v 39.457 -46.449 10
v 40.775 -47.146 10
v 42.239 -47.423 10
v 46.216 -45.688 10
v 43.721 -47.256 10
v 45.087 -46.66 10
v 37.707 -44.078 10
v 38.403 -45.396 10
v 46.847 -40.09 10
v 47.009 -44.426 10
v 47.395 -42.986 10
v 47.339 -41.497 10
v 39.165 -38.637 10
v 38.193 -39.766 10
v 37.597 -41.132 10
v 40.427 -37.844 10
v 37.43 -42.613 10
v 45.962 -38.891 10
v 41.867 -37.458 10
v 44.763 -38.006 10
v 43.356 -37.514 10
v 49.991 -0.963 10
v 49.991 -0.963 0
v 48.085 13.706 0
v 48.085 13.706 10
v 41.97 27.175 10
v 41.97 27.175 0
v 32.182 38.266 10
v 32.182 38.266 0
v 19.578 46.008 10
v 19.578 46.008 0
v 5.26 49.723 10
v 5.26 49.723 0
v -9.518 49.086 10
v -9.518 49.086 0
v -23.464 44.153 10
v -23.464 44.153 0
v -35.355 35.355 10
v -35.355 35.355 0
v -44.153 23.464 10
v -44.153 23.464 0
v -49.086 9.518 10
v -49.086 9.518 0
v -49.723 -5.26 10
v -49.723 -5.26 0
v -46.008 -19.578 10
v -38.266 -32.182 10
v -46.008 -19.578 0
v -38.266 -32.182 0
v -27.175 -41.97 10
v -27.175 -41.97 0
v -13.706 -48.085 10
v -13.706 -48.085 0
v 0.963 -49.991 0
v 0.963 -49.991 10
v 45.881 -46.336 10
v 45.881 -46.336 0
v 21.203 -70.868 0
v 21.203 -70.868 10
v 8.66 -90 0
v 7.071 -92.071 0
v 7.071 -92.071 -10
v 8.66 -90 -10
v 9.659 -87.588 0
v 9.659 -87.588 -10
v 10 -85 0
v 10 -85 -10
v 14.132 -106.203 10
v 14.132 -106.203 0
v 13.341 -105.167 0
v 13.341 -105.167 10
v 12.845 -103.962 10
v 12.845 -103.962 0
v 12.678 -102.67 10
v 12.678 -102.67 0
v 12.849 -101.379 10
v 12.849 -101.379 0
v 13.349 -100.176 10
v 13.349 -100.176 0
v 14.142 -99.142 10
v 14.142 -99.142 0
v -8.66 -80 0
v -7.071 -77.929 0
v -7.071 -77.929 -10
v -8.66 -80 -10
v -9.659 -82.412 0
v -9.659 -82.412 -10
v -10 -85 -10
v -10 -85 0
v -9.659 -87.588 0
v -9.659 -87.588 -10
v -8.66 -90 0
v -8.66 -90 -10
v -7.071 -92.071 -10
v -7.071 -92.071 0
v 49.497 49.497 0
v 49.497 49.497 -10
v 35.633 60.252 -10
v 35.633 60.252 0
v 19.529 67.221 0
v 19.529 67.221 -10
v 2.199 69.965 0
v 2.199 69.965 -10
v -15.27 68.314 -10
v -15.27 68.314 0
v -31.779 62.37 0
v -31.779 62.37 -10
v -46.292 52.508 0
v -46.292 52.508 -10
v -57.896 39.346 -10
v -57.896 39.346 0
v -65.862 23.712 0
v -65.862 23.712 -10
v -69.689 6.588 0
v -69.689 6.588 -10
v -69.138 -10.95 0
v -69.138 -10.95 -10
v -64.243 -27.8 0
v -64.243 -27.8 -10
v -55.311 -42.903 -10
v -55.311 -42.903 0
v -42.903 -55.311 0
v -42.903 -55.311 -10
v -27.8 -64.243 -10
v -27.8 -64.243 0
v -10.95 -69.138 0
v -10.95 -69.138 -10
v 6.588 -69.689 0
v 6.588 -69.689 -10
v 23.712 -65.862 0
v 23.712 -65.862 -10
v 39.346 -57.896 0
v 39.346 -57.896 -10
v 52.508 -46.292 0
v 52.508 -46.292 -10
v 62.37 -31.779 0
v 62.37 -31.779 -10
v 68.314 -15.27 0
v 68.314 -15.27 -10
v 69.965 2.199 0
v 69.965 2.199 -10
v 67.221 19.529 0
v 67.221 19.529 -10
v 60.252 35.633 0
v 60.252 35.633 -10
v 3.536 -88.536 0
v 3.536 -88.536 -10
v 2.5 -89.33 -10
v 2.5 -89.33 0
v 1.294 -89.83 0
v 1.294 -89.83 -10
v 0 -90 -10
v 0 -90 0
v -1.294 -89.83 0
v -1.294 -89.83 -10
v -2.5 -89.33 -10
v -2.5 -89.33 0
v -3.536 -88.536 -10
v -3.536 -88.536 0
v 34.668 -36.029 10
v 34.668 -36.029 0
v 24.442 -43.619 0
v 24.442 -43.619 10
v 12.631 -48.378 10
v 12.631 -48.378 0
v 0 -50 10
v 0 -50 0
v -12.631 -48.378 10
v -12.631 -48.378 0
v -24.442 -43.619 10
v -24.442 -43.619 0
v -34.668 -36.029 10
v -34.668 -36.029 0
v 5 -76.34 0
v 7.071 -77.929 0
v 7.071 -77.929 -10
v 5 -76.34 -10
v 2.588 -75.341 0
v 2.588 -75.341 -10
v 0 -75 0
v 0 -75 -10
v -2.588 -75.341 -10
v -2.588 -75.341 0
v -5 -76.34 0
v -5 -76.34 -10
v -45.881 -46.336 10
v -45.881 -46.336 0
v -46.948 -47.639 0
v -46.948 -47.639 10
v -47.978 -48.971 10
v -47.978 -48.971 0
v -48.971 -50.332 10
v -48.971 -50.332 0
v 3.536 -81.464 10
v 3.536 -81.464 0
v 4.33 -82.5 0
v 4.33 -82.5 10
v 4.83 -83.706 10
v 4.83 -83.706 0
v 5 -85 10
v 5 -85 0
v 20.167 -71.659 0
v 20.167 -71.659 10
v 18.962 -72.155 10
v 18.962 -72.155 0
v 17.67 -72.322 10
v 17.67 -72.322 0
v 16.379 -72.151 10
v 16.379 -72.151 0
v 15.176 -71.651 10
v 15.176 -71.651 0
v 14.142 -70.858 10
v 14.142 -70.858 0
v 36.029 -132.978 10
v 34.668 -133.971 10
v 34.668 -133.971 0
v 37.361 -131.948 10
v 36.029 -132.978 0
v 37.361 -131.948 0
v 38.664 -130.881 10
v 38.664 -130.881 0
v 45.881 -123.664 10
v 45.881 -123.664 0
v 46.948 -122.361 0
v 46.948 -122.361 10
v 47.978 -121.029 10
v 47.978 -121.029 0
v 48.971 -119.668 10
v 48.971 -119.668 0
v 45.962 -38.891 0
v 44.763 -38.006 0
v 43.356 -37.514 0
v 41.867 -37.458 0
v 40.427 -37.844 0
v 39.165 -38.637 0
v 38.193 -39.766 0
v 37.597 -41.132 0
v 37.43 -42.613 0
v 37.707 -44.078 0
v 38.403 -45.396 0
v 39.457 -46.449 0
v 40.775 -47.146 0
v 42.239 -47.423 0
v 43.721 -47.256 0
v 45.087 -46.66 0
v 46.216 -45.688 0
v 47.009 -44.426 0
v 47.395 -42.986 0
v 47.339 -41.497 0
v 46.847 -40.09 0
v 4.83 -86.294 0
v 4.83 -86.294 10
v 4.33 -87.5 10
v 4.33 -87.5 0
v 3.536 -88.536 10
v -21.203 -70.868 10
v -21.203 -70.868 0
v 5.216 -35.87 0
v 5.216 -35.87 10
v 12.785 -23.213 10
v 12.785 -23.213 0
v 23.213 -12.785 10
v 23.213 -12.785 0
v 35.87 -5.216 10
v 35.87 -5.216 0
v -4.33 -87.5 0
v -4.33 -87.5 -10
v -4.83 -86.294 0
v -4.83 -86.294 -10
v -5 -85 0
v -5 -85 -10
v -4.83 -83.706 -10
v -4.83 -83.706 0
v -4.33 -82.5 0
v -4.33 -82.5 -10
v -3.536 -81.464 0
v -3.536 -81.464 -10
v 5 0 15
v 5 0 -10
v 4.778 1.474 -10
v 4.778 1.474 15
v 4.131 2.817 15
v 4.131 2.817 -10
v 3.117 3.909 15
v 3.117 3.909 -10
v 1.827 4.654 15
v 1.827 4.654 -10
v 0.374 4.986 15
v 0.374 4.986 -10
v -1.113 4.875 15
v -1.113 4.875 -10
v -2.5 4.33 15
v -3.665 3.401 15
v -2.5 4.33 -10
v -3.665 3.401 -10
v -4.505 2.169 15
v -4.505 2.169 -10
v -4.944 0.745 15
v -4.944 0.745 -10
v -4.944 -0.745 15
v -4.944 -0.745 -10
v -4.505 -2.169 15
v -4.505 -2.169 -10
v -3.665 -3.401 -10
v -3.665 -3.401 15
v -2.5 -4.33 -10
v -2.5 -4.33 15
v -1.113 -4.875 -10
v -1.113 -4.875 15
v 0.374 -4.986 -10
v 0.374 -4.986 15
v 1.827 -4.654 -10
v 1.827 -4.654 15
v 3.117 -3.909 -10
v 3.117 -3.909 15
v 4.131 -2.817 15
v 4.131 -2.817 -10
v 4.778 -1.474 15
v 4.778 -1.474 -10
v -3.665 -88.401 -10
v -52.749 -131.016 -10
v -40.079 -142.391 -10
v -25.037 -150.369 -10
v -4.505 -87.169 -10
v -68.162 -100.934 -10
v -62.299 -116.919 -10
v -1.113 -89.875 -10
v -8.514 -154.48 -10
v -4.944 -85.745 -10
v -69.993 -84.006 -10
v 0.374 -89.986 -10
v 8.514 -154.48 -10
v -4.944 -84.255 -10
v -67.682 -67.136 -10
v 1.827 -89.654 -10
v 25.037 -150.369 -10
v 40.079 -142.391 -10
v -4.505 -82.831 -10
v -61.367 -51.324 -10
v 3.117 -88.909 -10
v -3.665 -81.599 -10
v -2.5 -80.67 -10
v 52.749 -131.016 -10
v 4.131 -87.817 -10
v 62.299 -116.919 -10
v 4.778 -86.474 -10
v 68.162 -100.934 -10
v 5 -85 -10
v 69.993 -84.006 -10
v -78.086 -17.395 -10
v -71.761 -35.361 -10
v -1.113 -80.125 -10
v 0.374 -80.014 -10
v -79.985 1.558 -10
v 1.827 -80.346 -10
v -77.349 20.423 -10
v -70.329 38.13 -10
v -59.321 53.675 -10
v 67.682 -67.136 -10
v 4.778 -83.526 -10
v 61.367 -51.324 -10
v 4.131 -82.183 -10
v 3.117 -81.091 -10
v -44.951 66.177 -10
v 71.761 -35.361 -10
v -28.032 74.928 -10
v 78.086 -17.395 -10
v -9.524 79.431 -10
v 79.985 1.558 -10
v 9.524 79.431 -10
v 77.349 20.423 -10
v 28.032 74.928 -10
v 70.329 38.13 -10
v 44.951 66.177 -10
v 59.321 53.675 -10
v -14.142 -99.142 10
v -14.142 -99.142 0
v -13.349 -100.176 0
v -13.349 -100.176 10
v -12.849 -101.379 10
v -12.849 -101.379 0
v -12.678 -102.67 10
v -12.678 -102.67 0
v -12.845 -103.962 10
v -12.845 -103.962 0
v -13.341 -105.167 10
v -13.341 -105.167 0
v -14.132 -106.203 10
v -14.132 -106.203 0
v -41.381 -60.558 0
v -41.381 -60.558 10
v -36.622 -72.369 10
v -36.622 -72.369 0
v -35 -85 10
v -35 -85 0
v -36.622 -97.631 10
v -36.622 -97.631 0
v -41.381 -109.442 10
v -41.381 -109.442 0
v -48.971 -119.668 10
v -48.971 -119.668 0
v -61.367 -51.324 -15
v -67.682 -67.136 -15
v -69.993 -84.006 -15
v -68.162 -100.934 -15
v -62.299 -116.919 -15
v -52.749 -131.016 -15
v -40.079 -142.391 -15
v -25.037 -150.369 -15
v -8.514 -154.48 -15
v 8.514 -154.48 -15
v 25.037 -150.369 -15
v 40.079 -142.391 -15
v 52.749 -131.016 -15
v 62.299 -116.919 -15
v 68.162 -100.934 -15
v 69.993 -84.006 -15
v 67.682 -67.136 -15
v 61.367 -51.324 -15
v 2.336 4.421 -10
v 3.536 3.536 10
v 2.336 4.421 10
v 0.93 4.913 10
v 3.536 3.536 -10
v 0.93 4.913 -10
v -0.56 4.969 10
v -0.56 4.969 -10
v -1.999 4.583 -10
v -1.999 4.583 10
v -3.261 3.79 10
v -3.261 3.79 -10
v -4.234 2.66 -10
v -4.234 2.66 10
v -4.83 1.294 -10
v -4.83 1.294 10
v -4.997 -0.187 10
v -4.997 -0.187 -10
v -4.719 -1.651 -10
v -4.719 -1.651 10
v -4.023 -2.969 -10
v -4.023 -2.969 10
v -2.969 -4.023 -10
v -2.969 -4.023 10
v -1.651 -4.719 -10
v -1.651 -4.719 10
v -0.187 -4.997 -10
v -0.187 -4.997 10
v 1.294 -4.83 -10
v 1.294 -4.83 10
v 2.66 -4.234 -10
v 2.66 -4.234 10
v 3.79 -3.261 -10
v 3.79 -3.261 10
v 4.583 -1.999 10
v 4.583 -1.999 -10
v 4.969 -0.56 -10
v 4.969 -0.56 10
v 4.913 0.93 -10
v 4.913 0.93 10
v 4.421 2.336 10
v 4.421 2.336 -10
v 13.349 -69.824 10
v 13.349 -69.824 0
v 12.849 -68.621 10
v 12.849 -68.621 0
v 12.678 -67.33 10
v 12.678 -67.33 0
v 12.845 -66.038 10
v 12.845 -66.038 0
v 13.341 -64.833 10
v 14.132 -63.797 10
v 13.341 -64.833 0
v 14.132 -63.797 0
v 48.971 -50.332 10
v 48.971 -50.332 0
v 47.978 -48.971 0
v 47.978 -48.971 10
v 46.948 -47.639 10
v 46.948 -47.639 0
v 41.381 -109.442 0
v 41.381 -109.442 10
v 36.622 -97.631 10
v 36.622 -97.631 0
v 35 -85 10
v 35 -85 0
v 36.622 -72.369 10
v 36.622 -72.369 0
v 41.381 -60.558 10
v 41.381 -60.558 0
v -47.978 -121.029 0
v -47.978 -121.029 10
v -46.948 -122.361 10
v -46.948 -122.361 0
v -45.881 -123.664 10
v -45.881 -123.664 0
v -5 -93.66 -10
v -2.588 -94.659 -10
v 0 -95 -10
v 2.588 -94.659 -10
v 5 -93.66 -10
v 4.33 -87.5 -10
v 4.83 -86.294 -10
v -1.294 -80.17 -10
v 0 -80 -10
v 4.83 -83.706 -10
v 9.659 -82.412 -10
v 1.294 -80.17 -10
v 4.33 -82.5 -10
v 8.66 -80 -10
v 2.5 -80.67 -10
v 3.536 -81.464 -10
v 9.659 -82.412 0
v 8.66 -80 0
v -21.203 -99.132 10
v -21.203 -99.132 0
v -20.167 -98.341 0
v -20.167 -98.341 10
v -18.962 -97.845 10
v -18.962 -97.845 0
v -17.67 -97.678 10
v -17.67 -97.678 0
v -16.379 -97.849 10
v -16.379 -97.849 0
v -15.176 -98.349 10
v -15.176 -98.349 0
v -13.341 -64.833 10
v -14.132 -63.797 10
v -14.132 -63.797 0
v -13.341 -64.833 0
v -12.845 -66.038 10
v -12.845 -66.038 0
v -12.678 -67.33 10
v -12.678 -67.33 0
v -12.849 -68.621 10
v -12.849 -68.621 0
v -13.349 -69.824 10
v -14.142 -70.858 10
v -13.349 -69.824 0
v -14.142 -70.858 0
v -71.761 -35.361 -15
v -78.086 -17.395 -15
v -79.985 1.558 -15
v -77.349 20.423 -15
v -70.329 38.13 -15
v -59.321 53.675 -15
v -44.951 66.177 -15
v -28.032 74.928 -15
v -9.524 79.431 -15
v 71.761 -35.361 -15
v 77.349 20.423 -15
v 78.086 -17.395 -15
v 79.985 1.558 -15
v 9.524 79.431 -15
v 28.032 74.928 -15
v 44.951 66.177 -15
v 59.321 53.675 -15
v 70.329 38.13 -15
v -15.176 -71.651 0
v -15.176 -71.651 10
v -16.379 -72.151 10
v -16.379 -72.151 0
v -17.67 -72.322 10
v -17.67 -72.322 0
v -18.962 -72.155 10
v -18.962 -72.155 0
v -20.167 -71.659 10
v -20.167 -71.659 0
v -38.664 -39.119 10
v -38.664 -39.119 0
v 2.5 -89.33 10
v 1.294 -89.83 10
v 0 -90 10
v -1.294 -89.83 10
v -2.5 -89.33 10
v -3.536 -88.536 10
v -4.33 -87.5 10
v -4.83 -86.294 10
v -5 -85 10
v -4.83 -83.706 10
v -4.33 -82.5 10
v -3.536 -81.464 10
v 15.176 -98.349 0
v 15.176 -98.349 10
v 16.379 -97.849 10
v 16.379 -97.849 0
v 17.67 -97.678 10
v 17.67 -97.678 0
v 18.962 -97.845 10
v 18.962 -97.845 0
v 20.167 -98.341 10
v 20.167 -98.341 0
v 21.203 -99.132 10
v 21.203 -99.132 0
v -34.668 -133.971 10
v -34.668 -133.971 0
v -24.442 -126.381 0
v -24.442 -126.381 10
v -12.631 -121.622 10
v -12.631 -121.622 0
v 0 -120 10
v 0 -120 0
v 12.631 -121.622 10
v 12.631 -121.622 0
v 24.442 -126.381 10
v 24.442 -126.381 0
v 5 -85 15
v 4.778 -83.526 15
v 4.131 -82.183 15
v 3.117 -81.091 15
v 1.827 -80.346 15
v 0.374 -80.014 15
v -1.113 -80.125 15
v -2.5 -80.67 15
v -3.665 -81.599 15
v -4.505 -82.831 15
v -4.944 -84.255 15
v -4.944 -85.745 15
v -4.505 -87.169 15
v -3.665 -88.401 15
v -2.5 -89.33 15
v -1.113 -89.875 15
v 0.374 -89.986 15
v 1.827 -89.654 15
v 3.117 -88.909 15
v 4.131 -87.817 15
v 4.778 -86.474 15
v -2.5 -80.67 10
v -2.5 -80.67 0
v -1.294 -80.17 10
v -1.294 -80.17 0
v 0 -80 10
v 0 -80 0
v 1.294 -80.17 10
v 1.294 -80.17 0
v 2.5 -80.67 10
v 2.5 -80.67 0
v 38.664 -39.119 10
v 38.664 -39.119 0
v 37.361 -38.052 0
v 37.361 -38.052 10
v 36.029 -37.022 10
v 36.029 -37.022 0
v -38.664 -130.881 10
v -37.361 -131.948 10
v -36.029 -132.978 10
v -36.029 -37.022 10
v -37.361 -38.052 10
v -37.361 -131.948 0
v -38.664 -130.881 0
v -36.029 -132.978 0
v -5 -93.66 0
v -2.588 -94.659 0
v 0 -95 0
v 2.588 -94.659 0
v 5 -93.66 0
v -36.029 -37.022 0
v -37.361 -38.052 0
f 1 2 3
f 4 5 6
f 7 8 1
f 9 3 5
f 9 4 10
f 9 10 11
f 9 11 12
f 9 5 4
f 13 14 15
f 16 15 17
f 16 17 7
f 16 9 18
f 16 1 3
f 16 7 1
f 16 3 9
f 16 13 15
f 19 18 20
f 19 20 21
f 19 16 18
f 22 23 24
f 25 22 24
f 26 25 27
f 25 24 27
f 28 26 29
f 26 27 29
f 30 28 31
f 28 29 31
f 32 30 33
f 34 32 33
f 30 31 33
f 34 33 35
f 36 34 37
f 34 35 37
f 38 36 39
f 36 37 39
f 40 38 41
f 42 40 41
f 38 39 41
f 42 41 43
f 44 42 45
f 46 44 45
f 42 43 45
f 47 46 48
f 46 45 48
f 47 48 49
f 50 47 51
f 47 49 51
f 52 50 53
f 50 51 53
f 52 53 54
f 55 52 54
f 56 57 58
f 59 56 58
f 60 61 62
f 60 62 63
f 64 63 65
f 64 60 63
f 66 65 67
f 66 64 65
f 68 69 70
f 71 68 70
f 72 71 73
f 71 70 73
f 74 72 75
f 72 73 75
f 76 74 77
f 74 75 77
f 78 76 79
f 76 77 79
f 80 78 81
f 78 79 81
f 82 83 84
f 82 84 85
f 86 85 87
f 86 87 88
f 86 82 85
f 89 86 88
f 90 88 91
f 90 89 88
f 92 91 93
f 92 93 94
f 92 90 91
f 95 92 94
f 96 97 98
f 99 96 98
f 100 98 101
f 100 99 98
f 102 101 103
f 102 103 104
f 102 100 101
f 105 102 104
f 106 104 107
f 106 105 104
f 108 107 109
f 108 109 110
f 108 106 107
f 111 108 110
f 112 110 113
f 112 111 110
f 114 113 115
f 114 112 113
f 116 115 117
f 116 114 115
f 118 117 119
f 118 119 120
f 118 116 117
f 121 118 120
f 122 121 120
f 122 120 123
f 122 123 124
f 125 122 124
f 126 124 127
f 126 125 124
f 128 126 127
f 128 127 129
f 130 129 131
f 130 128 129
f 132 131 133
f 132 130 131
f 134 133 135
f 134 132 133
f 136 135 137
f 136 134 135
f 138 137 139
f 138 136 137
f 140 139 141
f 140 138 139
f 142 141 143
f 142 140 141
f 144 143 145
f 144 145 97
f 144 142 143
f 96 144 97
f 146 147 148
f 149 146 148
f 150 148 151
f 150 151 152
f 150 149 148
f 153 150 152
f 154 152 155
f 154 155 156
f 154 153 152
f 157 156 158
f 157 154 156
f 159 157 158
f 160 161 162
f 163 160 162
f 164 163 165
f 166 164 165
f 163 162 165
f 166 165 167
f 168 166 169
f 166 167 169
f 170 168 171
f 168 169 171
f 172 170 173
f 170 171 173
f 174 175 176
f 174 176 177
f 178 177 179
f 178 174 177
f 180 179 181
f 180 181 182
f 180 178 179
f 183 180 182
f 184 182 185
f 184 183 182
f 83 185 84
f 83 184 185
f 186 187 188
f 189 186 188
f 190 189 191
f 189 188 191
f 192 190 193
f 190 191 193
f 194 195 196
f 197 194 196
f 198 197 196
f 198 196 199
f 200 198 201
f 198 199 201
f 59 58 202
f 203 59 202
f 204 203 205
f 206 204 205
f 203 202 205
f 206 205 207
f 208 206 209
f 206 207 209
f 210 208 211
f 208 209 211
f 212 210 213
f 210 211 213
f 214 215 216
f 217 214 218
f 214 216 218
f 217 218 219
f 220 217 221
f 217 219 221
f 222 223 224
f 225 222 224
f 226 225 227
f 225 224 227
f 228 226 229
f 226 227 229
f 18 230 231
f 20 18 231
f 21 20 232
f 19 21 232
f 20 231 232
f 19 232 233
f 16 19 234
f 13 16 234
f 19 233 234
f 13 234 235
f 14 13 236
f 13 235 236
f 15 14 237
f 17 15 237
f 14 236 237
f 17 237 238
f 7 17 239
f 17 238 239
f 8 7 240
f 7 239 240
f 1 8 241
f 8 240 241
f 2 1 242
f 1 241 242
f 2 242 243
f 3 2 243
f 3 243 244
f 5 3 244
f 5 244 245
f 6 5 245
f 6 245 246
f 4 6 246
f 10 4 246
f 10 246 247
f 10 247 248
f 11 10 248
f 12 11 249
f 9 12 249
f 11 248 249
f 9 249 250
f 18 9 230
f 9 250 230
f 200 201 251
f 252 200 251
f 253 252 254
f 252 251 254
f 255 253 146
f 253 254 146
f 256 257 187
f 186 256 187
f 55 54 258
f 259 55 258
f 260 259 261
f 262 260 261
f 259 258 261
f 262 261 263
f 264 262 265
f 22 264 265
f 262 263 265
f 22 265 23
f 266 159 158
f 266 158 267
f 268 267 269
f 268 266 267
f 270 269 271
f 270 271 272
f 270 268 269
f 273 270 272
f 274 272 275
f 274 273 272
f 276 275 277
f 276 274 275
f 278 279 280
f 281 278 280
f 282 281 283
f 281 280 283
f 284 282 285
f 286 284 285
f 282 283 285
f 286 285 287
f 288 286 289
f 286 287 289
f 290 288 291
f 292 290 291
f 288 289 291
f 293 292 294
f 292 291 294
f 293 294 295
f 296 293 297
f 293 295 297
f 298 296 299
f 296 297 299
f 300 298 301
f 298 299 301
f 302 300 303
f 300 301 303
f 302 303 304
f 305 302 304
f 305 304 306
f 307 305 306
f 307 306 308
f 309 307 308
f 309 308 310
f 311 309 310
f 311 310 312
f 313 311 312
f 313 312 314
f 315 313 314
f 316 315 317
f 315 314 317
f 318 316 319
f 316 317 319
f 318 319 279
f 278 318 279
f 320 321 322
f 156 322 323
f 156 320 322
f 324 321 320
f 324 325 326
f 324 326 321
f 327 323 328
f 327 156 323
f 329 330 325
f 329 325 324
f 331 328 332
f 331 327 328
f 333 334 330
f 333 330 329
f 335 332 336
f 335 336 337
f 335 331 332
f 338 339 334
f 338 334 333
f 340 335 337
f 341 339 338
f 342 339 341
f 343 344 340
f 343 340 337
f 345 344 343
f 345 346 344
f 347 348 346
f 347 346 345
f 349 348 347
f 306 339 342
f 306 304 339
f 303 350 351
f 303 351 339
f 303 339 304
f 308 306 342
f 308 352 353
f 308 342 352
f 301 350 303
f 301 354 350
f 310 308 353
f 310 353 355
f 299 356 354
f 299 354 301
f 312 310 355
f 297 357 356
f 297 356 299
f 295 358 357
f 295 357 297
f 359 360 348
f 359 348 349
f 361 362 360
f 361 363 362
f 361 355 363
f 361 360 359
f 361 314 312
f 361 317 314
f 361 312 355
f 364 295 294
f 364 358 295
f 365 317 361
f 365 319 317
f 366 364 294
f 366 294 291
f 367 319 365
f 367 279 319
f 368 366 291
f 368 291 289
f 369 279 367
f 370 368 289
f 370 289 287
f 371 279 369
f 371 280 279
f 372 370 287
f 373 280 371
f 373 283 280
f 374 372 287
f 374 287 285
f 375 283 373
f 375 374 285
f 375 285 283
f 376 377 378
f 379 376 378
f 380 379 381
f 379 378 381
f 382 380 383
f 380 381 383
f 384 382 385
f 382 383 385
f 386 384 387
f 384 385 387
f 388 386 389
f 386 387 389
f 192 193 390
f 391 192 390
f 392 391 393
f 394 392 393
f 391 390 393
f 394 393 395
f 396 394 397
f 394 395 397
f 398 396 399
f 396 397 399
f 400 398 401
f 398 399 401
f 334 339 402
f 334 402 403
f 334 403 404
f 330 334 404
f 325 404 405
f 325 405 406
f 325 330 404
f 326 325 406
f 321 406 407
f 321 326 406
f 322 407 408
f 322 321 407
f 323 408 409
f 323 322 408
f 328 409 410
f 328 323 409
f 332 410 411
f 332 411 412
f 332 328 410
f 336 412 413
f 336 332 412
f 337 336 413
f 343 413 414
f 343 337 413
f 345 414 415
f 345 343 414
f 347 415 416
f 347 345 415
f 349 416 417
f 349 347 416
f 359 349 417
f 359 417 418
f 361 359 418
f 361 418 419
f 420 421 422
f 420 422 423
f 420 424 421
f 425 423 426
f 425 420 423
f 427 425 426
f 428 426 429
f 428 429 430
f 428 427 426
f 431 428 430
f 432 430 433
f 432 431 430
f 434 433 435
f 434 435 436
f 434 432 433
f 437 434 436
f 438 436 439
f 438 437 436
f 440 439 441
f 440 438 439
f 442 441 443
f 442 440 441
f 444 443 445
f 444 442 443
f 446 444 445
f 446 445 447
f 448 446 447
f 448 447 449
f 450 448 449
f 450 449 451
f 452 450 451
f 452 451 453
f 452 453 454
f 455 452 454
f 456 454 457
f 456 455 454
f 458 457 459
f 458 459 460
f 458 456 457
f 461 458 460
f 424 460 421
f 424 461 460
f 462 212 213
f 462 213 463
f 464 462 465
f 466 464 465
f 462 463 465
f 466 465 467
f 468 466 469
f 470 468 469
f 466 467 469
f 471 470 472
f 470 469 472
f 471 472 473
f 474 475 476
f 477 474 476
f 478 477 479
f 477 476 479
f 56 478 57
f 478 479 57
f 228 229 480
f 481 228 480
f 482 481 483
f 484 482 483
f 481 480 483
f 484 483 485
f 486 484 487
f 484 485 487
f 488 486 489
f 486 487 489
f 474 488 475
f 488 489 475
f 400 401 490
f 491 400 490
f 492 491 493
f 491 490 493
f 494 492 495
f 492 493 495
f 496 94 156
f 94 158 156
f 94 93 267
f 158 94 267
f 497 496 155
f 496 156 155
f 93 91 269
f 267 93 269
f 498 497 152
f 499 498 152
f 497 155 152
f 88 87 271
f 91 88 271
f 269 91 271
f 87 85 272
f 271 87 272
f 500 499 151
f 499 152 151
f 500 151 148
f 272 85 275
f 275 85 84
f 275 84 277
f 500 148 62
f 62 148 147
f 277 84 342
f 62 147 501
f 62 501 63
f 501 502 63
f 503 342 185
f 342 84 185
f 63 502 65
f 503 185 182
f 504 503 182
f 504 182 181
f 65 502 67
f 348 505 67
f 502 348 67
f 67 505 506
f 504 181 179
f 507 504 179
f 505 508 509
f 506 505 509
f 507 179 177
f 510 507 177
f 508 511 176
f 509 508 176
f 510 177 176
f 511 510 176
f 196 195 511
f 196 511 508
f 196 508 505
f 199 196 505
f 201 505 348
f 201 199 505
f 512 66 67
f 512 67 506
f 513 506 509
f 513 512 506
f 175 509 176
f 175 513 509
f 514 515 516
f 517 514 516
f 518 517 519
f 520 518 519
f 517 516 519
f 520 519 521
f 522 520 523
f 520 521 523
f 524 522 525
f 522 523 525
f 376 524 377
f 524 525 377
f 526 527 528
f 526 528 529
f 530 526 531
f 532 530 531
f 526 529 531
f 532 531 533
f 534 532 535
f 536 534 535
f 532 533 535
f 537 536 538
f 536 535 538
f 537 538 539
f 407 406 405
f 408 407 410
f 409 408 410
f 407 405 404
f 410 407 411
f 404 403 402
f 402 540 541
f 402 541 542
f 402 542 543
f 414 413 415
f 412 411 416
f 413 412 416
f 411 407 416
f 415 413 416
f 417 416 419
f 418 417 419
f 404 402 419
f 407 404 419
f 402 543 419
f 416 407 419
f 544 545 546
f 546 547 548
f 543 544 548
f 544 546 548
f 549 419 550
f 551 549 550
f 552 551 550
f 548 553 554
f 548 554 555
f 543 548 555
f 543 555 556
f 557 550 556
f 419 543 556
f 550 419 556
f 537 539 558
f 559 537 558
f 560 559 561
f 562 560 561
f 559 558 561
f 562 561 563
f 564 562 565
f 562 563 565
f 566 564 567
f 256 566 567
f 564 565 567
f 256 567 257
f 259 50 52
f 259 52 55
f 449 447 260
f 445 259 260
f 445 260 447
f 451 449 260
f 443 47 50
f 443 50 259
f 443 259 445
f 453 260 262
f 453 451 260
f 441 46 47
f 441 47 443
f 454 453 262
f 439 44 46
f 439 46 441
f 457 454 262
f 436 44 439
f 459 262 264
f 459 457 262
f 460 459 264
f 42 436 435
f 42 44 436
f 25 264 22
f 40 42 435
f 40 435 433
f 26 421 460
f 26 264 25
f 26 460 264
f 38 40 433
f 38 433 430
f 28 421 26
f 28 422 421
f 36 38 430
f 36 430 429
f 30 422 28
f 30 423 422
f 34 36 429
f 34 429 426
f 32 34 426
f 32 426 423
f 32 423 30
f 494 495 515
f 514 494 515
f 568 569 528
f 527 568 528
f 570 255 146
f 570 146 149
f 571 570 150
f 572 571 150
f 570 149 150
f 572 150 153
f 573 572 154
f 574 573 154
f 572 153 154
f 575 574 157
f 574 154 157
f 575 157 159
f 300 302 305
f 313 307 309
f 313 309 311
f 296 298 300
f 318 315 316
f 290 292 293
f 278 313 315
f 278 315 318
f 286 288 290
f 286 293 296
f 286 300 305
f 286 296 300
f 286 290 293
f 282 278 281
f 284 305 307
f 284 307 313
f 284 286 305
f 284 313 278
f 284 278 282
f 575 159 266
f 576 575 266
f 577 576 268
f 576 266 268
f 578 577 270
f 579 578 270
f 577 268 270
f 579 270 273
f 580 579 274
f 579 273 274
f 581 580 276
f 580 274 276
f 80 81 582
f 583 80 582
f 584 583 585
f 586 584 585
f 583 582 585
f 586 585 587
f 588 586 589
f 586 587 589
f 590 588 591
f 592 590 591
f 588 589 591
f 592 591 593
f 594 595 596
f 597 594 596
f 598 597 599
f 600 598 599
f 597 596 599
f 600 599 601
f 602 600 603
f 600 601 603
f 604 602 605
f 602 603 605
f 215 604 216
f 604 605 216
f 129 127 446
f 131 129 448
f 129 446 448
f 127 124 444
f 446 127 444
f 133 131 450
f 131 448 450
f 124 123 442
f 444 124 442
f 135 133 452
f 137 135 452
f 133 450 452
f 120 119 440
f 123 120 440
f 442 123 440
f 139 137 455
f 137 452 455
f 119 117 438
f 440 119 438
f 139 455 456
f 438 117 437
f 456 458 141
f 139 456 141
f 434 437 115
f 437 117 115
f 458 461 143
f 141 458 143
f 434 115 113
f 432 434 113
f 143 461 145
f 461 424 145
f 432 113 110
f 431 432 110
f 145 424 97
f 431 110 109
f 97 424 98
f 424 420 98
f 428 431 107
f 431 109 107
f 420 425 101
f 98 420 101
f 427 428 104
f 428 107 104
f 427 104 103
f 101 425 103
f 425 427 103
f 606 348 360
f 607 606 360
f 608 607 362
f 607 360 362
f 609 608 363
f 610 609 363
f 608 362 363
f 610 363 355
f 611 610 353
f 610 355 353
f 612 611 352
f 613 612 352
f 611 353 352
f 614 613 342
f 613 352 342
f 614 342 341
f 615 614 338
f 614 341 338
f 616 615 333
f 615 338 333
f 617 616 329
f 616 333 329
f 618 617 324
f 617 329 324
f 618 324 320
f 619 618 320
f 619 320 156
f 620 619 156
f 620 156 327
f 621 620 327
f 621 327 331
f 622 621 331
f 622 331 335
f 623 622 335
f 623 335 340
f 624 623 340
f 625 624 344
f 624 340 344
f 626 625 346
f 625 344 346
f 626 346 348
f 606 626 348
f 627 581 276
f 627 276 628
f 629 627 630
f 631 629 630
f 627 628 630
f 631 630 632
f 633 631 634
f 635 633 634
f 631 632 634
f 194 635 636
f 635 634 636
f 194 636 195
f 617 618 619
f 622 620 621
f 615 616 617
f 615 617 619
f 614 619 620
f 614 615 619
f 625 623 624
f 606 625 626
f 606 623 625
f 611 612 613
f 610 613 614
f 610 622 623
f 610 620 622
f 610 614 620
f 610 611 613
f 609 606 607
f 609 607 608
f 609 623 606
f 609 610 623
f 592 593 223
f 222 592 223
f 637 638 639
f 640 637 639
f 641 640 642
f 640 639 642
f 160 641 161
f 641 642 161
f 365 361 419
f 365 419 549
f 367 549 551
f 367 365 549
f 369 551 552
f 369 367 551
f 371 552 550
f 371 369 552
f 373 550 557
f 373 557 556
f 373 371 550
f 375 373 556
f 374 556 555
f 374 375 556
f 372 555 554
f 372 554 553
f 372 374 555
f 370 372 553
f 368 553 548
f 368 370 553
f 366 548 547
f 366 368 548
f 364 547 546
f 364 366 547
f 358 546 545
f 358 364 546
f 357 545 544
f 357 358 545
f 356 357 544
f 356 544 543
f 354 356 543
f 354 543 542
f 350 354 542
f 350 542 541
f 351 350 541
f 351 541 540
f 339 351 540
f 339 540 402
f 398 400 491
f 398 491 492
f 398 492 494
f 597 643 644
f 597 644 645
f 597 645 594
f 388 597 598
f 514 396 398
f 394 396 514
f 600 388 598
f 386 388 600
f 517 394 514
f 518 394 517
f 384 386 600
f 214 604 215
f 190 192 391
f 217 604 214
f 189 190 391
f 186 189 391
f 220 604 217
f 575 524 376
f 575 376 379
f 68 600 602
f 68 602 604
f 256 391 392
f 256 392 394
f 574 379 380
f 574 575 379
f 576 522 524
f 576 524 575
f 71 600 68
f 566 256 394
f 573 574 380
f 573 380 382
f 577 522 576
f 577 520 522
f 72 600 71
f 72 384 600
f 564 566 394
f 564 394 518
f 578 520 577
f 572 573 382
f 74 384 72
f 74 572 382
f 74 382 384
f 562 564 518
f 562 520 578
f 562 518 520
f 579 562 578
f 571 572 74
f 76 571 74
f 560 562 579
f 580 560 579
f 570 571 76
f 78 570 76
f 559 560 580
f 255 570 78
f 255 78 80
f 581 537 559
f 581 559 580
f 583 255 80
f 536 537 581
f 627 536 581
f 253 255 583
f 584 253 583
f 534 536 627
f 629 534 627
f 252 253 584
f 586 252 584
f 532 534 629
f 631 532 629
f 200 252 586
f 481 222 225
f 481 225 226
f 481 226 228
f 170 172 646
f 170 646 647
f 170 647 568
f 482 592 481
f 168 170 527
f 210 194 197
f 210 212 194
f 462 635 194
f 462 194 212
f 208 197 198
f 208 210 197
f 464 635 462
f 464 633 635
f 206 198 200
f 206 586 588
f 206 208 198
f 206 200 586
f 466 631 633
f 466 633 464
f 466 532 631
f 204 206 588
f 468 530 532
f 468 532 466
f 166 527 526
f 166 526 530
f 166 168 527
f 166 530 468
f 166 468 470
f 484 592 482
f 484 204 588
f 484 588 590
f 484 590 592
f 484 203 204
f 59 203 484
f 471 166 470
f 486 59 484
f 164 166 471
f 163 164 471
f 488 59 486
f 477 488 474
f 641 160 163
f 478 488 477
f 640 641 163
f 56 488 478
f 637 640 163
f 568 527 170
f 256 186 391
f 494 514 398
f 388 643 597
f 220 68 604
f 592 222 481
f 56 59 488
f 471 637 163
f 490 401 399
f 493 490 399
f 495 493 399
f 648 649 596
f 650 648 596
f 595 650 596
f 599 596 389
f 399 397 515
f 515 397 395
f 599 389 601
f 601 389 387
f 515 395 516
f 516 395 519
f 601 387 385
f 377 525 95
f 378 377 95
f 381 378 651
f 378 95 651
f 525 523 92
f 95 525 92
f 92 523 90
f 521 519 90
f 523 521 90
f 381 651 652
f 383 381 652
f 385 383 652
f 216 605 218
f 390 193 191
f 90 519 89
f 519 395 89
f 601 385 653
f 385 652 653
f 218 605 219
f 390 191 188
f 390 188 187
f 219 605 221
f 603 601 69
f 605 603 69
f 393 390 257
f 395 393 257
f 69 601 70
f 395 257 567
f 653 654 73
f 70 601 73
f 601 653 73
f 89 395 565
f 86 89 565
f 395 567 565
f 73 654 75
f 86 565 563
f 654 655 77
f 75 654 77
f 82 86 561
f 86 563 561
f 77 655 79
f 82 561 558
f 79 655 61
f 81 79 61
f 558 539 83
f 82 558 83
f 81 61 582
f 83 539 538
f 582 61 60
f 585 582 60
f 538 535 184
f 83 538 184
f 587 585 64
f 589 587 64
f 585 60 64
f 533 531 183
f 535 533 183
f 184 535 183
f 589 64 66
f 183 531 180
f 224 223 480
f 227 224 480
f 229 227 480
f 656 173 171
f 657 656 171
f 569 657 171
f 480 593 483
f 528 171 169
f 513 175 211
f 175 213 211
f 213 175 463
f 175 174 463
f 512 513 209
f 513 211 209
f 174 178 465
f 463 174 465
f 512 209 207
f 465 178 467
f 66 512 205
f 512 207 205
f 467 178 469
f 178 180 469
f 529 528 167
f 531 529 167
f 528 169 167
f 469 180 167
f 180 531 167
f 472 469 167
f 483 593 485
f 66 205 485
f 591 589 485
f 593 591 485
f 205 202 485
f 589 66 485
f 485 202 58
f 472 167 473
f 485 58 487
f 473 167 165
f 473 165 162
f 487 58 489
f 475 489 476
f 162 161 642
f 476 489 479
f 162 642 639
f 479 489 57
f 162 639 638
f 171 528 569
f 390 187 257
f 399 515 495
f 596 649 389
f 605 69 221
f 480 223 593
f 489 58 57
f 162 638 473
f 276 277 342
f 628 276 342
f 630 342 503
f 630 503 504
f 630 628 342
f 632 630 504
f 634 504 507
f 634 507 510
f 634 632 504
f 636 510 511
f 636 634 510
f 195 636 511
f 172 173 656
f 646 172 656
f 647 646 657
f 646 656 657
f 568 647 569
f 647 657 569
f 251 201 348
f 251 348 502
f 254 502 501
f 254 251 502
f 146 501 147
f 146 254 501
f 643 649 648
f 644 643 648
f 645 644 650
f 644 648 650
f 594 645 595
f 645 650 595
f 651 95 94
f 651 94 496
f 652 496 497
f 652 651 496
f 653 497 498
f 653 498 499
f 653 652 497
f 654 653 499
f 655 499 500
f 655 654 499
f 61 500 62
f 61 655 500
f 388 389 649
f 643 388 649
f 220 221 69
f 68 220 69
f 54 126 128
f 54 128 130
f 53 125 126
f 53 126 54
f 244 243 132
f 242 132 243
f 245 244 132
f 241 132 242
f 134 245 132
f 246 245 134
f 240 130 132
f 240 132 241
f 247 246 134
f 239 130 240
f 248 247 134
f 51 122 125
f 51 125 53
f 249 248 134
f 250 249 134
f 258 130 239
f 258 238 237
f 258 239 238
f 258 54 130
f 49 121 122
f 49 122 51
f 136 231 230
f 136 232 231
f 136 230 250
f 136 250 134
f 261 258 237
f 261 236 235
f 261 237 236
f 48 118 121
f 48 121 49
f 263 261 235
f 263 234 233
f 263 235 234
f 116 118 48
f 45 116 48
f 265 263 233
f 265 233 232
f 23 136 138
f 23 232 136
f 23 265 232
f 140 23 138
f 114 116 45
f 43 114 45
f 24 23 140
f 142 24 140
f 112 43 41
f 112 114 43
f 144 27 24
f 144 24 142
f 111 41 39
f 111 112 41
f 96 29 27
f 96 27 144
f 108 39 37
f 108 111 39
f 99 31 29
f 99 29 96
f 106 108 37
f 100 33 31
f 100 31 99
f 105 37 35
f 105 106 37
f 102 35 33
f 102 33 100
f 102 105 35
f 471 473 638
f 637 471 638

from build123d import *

# Parameters (mm, degrees)
F1_R      = 70
F1_R_2    = 5
F2_DEPTH  = 10
F3_DEPTH  = 10
F4_ANGLE  = 45
F6_DEPTH  = 10
F7_DEPTH  = 10
F8_R      = 5
F9_DEPTH  = 5
F10_DEPTH = 25


with BuildPart() as f2:
    # F1 (on Top) → F2 (new body, through all)
    with BuildSketch(Plane.XY):
        Circle(F1_R)
        with Locations((0, -60)):
            Circle(F1_R_2, mode=Mode.SUBTRACT)
        with BuildLine():
            ThreePointArc((-34.6681624533, -36.0294117647), (0, 50), (34.6681624533, -36.0294117647))
            ThreePointArc((34.6681624533, -36.0294117647), (0, -25), (-34.6681624533, -36.0294117647))
        make_face(mode=Mode.SUBTRACT)
        with BuildLine():
            ThreePointArc((-34.6681624533, -36.0294117647), (0, -25), (34.6681624533, -36.0294117647))
            ThreePointArc((34.6681624533, -36.0294117647), (0, 50), (-34.6681624533, -36.0294117647))
        make_face()
        Circle(F1_R_2, mode=Mode.SUBTRACT)
        with Locations((0, -60)):
            Circle(F1_R_2)
    extrude(amount=-F2_DEPTH)

    # F1 (on Top) → F3 (join)
    with BuildSketch(Plane.XY):
        with BuildLine():
            ThreePointArc((-34.6681624533, -36.0294117647), (0, -25), (34.6681624533, -36.0294117647))
            ThreePointArc((34.6681624533, -36.0294117647), (0, 50), (-34.6681624533, -36.0294117647))
        make_face()
        Circle(F1_R_2, mode=Mode.SUBTRACT)
        with Locations((0, -60)):
            Circle(F1_R_2)
    extrude(amount=F3_DEPTH)


with BuildPart() as f2_1:
    # F4: moved
    add(f2.part.rotate(Axis((0, 0, 10), (0, 0, 1)), F4_ANGLE))


with BuildPart() as f6:
    # F5 (on Top) → F6 (new body)
    with BuildSketch(Plane.XY):
        with BuildLine():
            ThreePointArc((34.6681624533, -36.0294117647), (0, -50), (-34.6681624533, -36.0294117647))
            ThreePointArc((-34.6681624533, -36.0294117647), (-36.6987085211, -37.532065635), (-38.6642052515, -39.1188575527))
            Line((-38.6642052515, -39.1188575527), (-14.1316690741, -63.7972941912))
            ThreePointArc((-14.1316690741, -63.7972941912), (-12.6776750234, -67.3297424342), (-14.1421356237, -70.8578643763))
            Line((-14.1421356237, -70.8578643763), (-7.0710678119, -77.9289321881))
            ThreePointArc((-7.0710678119, -77.9289321881), (0, -75), (7.0710678119, -77.9289321881))
            Line((7.0710678119, -77.9289321881), (14.1421356237, -70.8578643763))
            ThreePointArc((14.1421356237, -70.8578643763), (12.6776750234, -67.3297424342), (14.1316690741, -63.7972941912))
            Line((14.1316690741, -63.7972941912), (38.6642052515, -39.1188575527))
            ThreePointArc((38.6642052515, -39.1188575527), (36.6987085211, -37.532065635), (34.6681624533, -36.0294117647))
        make_face()
        with BuildLine():
            Line((-7.0710678119, -77.9289321881), (-14.1421356237, -70.8578643763))
            ThreePointArc((-14.1421356237, -70.8578643763), (-17.6702575658, -72.3223249766), (-21.2027058088, -70.8683309259))
            Line((-21.2027058088, -70.8683309259), (-45.8811424473, -46.3357947485))
            ThreePointArc((-45.8811424473, -46.3357947485), (-47.467934365, -48.3012914789), (-48.9705882353, -50.3318375467))
            ThreePointArc((-48.9705882353, -50.3318375467), (-35, -85), (-48.9705882353, -119.6681624533))
            ThreePointArc((-48.9705882353, -119.6681624533), (-47.467934365, -121.6987085211), (-45.8811424473, -123.6642052515))
            Line((-45.8811424473, -123.6642052515), (-21.2027058088, -99.1316690741))
            ThreePointArc((-21.2027058088, -99.1316690741), (-17.6702575658, -97.6776750234), (-14.1421356237, -99.1421356237))
            Line((-14.1421356237, -99.1421356237), (-7.0710678119, -92.0710678119))
            ThreePointArc((-7.0710678119, -92.0710678119), (-10, -85), (-7.0710678119, -77.9289321881))
        make_face()
        with BuildLine():
            ThreePointArc((21.2027058088, -70.8683309259), (17.6702575658, -72.3223249766), (14.1421356237, -70.8578643763))
            Line((14.1421356237, -70.8578643763), (7.0710678119, -77.9289321881))
            ThreePointArc((7.0710678119, -77.9289321881), (9.2387953251, -81.1731656763), (10, -85))
            ThreePointArc((10, -85), (9.2387953251, -88.8268343237), (7.0710678119, -92.0710678119))
            Line((7.0710678119, -92.0710678119), (14.1421356237, -99.1421356237))
            ThreePointArc((14.1421356237, -99.1421356237), (17.6702575658, -97.6776750234), (21.2027058088, -99.1316690741))
            Line((21.2027058088, -99.1316690741), (45.8811424473, -123.6642052515))
            ThreePointArc((45.8811424473, -123.6642052515), (47.467934365, -121.6987085211), (48.9705882353, -119.6681624533))
            ThreePointArc((48.9705882353, -119.6681624533), (35, -85), (48.9705882353, -50.3318375467))
            ThreePointArc((48.9705882353, -50.3318375467), (47.467934365, -48.3012914789), (45.8811424473, -46.3357947485))
            Line((45.8811424473, -46.3357947485), (21.2027058088, -70.8683309259))
        make_face()
        with BuildLine():
            ThreePointArc((7.0710678119, -92.0710678119), (0, -95), (-7.0710678119, -92.0710678119))
            Line((-7.0710678119, -92.0710678119), (-14.1421356237, -99.1421356237))
            ThreePointArc((-14.1421356237, -99.1421356237), (-12.6776750234, -102.6702575658), (-14.1316690741, -106.2027058088))
            Line((-14.1316690741, -106.2027058088), (-38.6642052515, -130.8811424473))
            ThreePointArc((-38.6642052515, -130.8811424473), (-36.6987085211, -132.467934365), (-34.6681624533, -133.9705882353))
            ThreePointArc((-34.6681624533, -133.9705882353), (0, -120), (34.6681624533, -133.9705882353))
            ThreePointArc((34.6681624533, -133.9705882353), (36.6987085211, -132.467934365), (38.6642052515, -130.8811424473))
            Line((38.6642052515, -130.8811424473), (14.1316690741, -106.2027058088))
            ThreePointArc((14.1316690741, -106.2027058088), (12.6776750234, -102.6702575658), (14.1421356237, -99.1421356237))
            Line((14.1421356237, -99.1421356237), (7.0710678119, -92.0710678119))
        make_face()
        with BuildLine():
            Line((-3.5355339059, -81.4644660941), (-7.0710678119, -77.9289321881))
            ThreePointArc((-7.0710678119, -77.9289321881), (-10, -85), (-7.0710678119, -92.0710678119))
            Line((-7.0710678119, -92.0710678119), (-3.5355339059, -88.5355339059))
            ThreePointArc((-3.5355339059, -88.5355339059), (-5, -85), (-3.5355339059, -81.4644660941))
        make_face()
        with BuildLine():
            ThreePointArc((7.0710678119, -77.9289321881), (0, -75), (-7.0710678119, -77.9289321881))
            Line((-7.0710678119, -77.9289321881), (-3.5355339059, -81.4644660941))
            ThreePointArc((-3.5355339059, -81.4644660941), (0, -80), (3.5355339059, -81.4644660941))
            Line((3.5355339059, -81.4644660941), (7.0710678119, -77.9289321881))
        make_face()
        with BuildLine():
            ThreePointArc((10, -85), (9.2387953251, -81.1731656763), (7.0710678119, -77.9289321881))
            Line((7.0710678119, -77.9289321881), (3.5355339059, -81.4644660941))
            ThreePointArc((3.5355339059, -81.4644660941), (4.6193976626, -83.0865828382), (5, -85))
            ThreePointArc((5, -85), (4.6193976626, -86.9134171618), (3.5355339059, -88.5355339059))
            Line((3.5355339059, -88.5355339059), (7.0710678119, -92.0710678119))
            ThreePointArc((7.0710678119, -92.0710678119), (9.2387953251, -88.8268343237), (10, -85))
        make_face()
        with BuildLine():
            Line((-3.5355339059, -88.5355339059), (-7.0710678119, -92.0710678119))
            ThreePointArc((-7.0710678119, -92.0710678119), (0, -95), (7.0710678119, -92.0710678119))
            Line((7.0710678119, -92.0710678119), (3.5355339059, -88.5355339059))
            ThreePointArc((3.5355339059, -88.5355339059), (0, -90), (-3.5355339059, -88.5355339059))
        make_face()
    extrude(amount=F6_DEPTH)

    # F5 (on Top) → F7 (join, through all)
    with BuildSketch(Plane.XY):
        with BuildLine():
            ThreePointArc((10, -85), (9.2387953251, -81.1731656763), (7.0710678119, -77.9289321881))
            Line((7.0710678119, -77.9289321881), (3.5355339059, -81.4644660941))
            ThreePointArc((3.5355339059, -81.4644660941), (4.6193976626, -83.0865828382), (5, -85))
            ThreePointArc((5, -85), (4.6193976626, -86.9134171618), (3.5355339059, -88.5355339059))
            Line((3.5355339059, -88.5355339059), (7.0710678119, -92.0710678119))
            ThreePointArc((7.0710678119, -92.0710678119), (9.2387953251, -88.8268343237), (10, -85))
        make_face()
        with BuildLine():
            Line((-3.5355339059, -88.5355339059), (-7.0710678119, -92.0710678119))
            ThreePointArc((-7.0710678119, -92.0710678119), (0, -95), (7.0710678119, -92.0710678119))
            Line((7.0710678119, -92.0710678119), (3.5355339059, -88.5355339059))
            ThreePointArc((3.5355339059, -88.5355339059), (0, -90), (-3.5355339059, -88.5355339059))
        make_face()
        with BuildLine():
            Line((-3.5355339059, -81.4644660941), (-7.0710678119, -77.9289321881))
            ThreePointArc((-7.0710678119, -77.9289321881), (-10, -85), (-7.0710678119, -92.0710678119))
            Line((-7.0710678119, -92.0710678119), (-3.5355339059, -88.5355339059))
            ThreePointArc((-3.5355339059, -88.5355339059), (-5, -85), (-3.5355339059, -81.4644660941))
        make_face()
        with BuildLine():
            ThreePointArc((7.0710678119, -77.9289321881), (0, -75), (-7.0710678119, -77.9289321881))
            Line((-7.0710678119, -77.9289321881), (-3.5355339059, -81.4644660941))
            ThreePointArc((-3.5355339059, -81.4644660941), (0, -80), (3.5355339059, -81.4644660941))
            Line((3.5355339059, -81.4644660941), (7.0710678119, -77.9289321881))
        make_face()
    extrude(amount=-F7_DEPTH)


with BuildPart() as f9:
    # F8 (on offset) → F9 (new body)
    with BuildSketch(Plane.XY.offset(-10)):
        with BuildLine():
            ThreePointArc((-61.3668911443, -51.3235294118), (0, -155), (61.3668911443, -51.3235294118))
            ThreePointArc((61.3668911443, -51.3235294118), (0, 80), (-61.3668911443, -51.3235294118))
        make_face()
        with Locations((0, -85)):
            Circle(F8_R, mode=Mode.SUBTRACT)
        Circle(F8_R, mode=Mode.SUBTRACT)
        with Locations((0, -85)):
            Circle(F8_R)
        Circle(F8_R)
    extrude(amount=-F9_DEPTH)

    # F8 (on offset) → F10 (join)
    with BuildSketch(Plane.XY.offset(-10)):
        Circle(F8_R)
        with Locations((0, -85)):
            Circle(F8_R)
    extrude(amount=F10_DEPTH)


solid = Compound([f2_1.part, f6.part, f9.part])
